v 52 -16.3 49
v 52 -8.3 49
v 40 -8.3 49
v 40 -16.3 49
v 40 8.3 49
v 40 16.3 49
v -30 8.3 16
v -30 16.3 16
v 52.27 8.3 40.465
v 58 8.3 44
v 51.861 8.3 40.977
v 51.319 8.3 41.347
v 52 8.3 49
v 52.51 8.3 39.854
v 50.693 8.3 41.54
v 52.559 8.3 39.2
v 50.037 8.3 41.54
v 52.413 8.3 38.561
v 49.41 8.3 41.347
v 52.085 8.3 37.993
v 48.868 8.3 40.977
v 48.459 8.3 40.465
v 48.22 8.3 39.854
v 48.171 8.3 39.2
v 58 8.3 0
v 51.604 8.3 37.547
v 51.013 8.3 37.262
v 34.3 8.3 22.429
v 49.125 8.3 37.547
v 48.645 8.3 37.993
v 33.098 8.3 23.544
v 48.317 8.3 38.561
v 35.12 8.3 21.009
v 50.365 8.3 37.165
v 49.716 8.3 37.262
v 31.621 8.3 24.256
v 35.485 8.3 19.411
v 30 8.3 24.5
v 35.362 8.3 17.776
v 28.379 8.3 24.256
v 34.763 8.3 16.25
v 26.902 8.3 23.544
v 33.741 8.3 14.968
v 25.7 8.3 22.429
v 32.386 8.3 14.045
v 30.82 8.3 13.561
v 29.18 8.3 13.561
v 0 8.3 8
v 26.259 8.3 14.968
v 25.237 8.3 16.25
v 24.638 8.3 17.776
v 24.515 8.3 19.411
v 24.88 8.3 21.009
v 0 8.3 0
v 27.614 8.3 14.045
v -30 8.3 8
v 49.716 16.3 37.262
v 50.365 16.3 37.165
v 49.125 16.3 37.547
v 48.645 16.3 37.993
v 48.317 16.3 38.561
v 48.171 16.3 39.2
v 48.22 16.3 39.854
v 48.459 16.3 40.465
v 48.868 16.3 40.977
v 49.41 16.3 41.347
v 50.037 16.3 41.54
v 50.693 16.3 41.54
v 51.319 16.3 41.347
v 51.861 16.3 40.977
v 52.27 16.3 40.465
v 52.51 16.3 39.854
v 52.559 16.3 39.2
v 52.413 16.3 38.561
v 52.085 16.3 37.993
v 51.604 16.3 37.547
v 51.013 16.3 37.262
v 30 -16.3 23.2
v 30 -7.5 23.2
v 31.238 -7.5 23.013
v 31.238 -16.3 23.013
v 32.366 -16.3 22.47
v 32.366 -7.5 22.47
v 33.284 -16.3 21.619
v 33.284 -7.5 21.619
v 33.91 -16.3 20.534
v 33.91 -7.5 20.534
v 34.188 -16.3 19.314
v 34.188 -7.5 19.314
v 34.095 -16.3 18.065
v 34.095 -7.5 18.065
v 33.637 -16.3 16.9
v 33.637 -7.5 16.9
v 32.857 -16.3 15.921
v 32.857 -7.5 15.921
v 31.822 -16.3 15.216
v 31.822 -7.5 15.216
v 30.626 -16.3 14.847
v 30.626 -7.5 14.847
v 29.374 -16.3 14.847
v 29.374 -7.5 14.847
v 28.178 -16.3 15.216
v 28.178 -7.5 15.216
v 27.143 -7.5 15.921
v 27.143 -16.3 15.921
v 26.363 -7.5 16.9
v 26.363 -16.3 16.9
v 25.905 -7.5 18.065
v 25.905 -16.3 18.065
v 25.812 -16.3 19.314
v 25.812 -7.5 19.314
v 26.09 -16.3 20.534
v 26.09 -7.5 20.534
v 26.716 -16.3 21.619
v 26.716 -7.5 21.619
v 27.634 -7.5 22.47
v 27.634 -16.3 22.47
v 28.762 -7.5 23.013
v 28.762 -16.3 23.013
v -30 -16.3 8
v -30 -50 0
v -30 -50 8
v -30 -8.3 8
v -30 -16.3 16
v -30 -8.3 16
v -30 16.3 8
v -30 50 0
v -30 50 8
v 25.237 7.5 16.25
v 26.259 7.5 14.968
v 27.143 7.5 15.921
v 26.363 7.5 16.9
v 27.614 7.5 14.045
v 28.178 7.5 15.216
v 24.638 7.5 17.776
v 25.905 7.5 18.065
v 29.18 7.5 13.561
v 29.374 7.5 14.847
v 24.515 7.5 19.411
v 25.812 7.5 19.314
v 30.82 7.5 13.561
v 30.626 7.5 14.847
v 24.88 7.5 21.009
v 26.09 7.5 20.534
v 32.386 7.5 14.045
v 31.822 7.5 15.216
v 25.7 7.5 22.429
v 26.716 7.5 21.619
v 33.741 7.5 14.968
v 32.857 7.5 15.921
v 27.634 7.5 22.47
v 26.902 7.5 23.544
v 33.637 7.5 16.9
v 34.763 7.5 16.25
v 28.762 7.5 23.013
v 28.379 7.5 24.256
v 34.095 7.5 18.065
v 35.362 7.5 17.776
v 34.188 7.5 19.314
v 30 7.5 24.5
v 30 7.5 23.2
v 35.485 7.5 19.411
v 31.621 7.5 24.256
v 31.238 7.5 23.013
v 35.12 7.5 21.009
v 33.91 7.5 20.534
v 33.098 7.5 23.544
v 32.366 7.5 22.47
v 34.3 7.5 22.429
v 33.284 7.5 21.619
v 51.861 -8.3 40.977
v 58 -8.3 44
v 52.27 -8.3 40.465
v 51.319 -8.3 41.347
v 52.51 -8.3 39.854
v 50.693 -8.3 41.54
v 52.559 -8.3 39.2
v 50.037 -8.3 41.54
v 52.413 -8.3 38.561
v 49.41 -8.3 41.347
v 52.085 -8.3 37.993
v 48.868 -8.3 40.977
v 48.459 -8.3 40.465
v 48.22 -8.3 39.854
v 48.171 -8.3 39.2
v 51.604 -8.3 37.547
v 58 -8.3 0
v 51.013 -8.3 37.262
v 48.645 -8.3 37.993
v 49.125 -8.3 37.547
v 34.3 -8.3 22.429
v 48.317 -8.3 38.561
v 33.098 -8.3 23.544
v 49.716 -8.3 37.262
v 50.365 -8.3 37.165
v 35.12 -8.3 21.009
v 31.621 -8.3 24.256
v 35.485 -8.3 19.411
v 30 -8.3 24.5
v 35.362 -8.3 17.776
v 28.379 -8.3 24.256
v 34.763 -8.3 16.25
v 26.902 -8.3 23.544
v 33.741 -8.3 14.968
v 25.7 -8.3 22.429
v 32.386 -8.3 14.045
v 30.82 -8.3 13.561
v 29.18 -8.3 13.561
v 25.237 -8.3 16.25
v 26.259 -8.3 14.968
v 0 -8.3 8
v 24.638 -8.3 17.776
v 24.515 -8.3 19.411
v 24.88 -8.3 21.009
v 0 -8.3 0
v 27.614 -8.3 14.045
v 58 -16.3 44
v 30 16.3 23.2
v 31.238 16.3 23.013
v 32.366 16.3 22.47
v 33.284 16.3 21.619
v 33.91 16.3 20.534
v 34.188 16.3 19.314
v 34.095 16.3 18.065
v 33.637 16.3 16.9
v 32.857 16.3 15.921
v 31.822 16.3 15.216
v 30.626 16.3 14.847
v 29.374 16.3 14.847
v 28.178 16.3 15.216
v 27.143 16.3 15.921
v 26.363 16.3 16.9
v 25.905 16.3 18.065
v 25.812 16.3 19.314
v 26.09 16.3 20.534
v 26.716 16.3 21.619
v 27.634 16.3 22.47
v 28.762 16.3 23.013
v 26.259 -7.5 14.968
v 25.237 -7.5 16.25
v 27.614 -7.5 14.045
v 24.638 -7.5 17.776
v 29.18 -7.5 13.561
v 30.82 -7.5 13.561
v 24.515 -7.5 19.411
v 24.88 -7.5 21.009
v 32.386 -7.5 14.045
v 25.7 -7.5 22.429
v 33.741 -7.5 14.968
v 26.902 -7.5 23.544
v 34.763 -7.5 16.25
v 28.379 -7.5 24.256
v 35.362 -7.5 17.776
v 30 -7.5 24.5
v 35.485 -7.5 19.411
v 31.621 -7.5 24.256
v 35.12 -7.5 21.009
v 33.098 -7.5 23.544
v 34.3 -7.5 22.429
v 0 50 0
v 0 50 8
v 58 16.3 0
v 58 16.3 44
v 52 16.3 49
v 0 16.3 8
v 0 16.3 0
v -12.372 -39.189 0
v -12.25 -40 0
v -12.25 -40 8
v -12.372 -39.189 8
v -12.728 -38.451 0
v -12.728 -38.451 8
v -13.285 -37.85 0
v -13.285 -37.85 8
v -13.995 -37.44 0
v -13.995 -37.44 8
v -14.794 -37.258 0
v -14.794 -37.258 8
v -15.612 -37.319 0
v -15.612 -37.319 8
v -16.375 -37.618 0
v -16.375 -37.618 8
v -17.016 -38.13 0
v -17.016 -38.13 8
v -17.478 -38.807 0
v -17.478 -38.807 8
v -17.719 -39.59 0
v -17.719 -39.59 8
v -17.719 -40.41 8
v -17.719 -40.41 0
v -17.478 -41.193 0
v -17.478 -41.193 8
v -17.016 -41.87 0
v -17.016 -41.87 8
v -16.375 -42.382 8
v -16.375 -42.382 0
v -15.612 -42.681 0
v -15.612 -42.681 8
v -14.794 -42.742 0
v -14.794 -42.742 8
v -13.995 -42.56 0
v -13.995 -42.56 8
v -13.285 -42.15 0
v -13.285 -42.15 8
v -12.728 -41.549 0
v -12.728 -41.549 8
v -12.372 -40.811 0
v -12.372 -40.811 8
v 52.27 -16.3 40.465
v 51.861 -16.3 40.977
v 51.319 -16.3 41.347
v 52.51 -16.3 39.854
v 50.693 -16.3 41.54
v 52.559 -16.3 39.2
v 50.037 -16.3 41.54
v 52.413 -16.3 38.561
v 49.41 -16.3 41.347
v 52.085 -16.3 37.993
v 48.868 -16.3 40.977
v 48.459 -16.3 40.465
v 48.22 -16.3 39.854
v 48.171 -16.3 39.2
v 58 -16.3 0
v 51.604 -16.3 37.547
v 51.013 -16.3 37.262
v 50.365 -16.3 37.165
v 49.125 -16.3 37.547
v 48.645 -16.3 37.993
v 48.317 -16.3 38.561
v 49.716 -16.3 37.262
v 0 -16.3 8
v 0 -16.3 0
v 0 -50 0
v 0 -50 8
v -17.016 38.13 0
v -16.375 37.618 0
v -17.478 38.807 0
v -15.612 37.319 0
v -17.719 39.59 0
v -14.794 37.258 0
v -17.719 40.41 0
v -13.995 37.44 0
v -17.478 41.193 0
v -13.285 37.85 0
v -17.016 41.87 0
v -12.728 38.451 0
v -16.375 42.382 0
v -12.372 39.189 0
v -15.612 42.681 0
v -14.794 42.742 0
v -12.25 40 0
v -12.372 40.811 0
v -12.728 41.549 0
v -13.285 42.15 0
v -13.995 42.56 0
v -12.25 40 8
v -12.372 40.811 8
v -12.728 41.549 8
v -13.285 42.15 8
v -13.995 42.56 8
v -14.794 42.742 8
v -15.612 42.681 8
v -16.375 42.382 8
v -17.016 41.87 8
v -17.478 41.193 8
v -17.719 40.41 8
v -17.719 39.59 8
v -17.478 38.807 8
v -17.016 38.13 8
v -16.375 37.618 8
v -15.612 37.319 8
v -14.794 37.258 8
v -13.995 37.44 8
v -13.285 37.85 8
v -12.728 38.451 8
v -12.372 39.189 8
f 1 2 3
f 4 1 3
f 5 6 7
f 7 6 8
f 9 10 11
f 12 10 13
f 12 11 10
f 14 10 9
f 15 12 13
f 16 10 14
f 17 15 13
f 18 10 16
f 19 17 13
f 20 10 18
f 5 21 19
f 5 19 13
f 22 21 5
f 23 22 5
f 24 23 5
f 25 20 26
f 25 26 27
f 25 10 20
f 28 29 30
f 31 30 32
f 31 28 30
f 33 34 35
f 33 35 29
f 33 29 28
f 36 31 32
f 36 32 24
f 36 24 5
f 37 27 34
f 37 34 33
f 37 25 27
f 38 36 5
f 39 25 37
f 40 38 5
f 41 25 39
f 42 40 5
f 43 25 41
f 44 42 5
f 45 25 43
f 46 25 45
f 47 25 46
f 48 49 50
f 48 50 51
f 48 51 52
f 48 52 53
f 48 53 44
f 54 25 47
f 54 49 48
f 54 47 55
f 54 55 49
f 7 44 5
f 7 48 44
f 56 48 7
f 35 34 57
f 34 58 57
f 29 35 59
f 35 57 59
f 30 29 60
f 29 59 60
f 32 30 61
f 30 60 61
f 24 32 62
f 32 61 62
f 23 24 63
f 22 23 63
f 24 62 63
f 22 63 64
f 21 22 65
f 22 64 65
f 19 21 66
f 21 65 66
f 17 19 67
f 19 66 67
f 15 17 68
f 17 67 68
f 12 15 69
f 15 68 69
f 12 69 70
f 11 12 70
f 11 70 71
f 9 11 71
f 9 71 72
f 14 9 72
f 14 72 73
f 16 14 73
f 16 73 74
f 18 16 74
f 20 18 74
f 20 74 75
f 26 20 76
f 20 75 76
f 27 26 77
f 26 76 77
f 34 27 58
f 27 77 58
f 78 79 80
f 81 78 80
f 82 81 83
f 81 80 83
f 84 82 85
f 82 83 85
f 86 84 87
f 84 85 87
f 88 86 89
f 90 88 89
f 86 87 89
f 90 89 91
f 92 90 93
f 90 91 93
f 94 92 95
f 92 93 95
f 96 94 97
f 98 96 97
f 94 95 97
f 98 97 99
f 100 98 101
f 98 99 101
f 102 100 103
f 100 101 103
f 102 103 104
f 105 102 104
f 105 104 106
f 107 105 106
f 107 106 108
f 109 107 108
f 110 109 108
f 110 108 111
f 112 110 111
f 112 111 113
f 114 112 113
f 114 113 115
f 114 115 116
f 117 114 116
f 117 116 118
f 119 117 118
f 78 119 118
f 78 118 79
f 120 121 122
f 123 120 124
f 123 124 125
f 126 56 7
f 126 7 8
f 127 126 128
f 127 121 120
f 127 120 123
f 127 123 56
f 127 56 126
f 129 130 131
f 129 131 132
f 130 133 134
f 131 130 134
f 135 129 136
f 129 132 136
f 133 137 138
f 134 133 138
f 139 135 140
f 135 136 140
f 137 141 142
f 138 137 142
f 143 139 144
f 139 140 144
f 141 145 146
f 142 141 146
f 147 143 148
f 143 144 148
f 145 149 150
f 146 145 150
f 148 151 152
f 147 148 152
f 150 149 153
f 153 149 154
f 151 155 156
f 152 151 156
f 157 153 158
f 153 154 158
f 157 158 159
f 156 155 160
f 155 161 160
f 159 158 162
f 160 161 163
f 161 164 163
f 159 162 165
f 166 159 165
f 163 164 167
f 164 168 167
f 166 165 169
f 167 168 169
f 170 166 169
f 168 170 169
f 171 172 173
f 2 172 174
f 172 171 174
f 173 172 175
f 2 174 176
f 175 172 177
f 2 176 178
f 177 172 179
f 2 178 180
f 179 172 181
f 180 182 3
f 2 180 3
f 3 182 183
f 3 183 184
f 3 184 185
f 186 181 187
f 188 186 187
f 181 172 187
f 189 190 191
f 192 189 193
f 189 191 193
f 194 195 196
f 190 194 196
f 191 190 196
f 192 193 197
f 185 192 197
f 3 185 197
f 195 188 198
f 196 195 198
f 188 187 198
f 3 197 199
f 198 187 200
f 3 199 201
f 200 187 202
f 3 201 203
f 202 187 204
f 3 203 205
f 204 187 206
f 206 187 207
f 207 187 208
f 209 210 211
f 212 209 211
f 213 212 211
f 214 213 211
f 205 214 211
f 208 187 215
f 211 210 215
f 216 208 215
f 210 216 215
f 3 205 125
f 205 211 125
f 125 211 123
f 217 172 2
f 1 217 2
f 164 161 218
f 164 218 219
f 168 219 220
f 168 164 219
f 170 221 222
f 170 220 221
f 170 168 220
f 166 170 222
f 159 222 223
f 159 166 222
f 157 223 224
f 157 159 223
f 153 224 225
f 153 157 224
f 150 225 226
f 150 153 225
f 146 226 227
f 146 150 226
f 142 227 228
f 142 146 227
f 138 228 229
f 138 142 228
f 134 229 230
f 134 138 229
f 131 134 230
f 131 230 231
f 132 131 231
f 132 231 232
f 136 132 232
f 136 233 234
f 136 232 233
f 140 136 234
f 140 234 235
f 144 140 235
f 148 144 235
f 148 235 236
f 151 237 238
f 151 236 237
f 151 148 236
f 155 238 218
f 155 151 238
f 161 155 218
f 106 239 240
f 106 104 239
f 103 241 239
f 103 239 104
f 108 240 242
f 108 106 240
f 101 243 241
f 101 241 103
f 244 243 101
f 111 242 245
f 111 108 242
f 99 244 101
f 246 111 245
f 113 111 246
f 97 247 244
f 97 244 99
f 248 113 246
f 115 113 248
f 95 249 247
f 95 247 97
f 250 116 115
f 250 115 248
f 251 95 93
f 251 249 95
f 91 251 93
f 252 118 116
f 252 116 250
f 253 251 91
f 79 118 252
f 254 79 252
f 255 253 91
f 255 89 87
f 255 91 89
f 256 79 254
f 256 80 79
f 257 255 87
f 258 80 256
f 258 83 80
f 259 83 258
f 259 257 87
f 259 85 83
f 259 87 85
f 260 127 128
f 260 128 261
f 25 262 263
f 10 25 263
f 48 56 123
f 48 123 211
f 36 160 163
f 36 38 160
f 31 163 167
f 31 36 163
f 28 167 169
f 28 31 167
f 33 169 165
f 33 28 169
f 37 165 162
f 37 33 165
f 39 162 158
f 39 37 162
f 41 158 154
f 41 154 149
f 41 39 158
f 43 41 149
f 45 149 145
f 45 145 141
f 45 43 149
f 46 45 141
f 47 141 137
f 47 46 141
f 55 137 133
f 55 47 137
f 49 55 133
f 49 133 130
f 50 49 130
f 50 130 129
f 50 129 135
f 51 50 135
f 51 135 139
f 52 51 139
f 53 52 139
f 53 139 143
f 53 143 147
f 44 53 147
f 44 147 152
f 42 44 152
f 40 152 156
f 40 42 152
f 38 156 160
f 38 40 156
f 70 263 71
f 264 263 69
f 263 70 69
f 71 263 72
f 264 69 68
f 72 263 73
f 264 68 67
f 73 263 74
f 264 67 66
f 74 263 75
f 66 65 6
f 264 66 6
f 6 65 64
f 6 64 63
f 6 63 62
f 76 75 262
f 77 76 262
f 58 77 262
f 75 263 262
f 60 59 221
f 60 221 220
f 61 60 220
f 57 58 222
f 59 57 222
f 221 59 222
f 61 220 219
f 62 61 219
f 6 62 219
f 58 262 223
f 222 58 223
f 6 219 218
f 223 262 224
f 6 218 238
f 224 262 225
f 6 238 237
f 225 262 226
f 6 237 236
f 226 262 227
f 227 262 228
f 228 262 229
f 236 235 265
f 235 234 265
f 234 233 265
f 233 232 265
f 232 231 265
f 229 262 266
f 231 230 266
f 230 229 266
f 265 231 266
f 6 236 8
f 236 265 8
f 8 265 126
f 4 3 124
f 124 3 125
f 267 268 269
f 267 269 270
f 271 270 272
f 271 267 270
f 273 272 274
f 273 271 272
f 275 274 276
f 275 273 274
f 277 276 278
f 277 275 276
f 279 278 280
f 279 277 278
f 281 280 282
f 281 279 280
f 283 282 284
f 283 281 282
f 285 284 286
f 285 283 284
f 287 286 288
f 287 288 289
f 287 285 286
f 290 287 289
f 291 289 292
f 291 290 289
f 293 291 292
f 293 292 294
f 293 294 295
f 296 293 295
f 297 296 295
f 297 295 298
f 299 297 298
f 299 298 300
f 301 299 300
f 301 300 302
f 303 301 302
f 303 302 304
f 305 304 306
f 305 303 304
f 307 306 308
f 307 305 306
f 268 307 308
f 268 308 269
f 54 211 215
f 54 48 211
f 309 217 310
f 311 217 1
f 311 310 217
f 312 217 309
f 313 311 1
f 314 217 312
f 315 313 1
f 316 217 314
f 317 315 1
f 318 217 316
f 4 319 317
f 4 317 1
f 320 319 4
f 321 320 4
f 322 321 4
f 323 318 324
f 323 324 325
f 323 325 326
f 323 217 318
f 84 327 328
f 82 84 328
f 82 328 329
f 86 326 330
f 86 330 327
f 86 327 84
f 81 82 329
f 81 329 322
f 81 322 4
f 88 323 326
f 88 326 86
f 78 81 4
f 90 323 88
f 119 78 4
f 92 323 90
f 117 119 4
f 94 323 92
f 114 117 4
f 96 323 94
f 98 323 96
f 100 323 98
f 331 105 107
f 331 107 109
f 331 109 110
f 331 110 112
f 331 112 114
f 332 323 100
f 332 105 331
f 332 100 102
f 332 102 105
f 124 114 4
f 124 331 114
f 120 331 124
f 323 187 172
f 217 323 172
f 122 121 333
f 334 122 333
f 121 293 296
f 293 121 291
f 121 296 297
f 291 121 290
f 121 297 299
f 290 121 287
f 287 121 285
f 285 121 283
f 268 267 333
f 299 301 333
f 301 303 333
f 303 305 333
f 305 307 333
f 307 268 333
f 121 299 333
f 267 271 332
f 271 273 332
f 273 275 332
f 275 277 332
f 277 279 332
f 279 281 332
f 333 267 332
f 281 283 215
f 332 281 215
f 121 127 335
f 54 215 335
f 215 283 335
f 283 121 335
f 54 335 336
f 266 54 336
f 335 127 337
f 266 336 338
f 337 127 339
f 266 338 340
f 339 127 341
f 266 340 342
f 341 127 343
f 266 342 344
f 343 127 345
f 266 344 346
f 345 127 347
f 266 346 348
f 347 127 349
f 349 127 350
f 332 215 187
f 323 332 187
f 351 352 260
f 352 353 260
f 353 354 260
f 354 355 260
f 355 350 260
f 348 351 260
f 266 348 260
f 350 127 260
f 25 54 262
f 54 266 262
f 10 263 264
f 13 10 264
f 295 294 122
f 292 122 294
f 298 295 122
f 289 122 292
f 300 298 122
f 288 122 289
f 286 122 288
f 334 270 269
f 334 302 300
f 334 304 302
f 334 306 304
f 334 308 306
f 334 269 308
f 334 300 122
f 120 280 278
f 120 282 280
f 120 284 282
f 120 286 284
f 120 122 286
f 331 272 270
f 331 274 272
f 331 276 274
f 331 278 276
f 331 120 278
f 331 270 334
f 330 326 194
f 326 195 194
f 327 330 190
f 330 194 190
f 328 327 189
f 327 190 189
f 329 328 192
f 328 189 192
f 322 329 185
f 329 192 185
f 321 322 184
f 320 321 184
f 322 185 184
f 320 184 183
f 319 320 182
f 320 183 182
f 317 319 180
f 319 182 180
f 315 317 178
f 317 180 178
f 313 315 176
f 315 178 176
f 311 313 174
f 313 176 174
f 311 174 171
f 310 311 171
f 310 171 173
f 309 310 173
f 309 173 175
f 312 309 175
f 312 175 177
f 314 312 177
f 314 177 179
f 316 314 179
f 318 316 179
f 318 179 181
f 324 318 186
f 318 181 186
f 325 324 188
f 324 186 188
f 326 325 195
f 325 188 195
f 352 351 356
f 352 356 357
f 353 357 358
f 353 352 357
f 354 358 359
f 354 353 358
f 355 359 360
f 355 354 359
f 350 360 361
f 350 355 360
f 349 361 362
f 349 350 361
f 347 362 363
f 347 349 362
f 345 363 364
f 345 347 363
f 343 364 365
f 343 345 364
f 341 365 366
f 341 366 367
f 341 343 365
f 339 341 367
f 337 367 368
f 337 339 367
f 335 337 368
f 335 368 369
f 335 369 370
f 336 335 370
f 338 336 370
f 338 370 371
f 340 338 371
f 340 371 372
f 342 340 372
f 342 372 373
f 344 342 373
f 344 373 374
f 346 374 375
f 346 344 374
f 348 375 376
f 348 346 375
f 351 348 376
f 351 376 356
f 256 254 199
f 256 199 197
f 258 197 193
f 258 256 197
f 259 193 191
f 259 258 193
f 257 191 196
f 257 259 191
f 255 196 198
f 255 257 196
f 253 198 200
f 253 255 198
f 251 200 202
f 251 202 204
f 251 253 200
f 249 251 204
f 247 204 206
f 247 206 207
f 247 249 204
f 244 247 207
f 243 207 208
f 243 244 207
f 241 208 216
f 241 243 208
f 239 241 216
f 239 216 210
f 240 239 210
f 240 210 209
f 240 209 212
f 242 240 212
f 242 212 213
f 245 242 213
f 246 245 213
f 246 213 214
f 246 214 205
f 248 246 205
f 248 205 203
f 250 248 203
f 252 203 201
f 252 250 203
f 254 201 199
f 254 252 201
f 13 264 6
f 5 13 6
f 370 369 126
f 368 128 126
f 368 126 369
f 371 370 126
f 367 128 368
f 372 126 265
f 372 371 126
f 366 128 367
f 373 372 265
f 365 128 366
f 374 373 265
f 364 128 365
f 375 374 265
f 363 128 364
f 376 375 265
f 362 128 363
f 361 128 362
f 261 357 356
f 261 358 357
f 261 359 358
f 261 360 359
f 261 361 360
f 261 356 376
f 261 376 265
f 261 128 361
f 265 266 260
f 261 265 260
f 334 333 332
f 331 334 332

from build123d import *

# Parameters (mm, degrees)
SKETCH_1_W          = 30
SKETCH_1_H          = 100
SKETCH_1_R          = 2.75
EXTRUDE_2_DEPTH     = 8
EXTRUDE_4_DEPTH     = 16.3
CUT_EXTRUDE_1_DEPTH = 8.3
SKETCH_5_R          = 5.5
EXTRUDE_5_DEPTH     = 8.3
SKETCH_6_R          = 5.5
CUT_EXTRUDE_2_DEPTH = 7.5
SKETCH_7_R          = 4.2
SKETCH_7_R_2        = 2.2
CUT_EXTRUDE_3_DEPTH = 21.3


with BuildPart() as part:
    # 草图1 → 凸台-拉伸2 (new body)
    with BuildSketch(Plane.XY):
        with Locations((-15, 0)):
            Rectangle(SKETCH_1_W, SKETCH_1_H)
        with Locations((-15, -40)):
            Circle(SKETCH_1_R, mode=Mode.SUBTRACT)
        with Locations((-15, 40)):
            Circle(SKETCH_1_R, mode=Mode.SUBTRACT)
    extrude(amount=EXTRUDE_2_DEPTH)

    # 草图3 → 凸台-拉伸4 (add, symmetric)
    with BuildSketch(Plane(origin=(0, 0, 0), x_dir=(1, 0, 0), z_dir=(0, 1, 0))):
        Polygon((-30, 0), (58, 0), (58, -44), (52, -49), (40, -49), (-30, -16), align=None)
    extrude(amount=EXTRUDE_4_DEPTH, both=True)

    # 草图4 → 切除-拉伸1 (cut, symmetric)
    with BuildSketch(Plane(origin=(0, 0, 0), x_dir=(1, 0, 0), z_dir=(0, 1, 0))):
        Polygon((-30, -8), (0, -8), (0, 0), (58, 0), (58, -44), (52, -49), (40, -49), (-30, -16), align=None)
    extrude(amount=CUT_EXTRUDE_1_DEPTH, both=True, mode=Mode.SUBTRACT)

    # 草图5 → 凸台-拉伸5 (add, symmetric)
    with BuildSketch(Plane(origin=(0, 0, 0), x_dir=(1, 0, 0), z_dir=(0, 1, 0))):
        with Locations(Location((30, -19, 0), (0, 0, 270))):
            Circle(SKETCH_5_R)
    extrude(amount=EXTRUDE_5_DEPTH, both=True)

    # 草图6 → 切除-拉伸2 (cut, symmetric)
    with BuildSketch(Plane(origin=(0, 0, 0), x_dir=(1, 0, 0), z_dir=(0, 1, 0))):
        with Locations(Location((30, -19, 0), (0, 0, 270))):
            Circle(SKETCH_6_R)
    extrude(amount=CUT_EXTRUDE_2_DEPTH, both=True, mode=Mode.SUBTRACT)

    # 草图7 → 切除-拉伸3 (cut, symmetric)
    with BuildSketch(Plane(origin=(0, 0, 0), x_dir=(1, 0, 0), z_dir=(0, 1, 0))):
        with Locations(Location((30, -19, 0), (0, 0, 270))):
            Circle(SKETCH_7_R)
        with Locations(Location((50.364675298, -39.364675298, 0), (0, 0, 90))):
            Circle(SKETCH_7_R_2)
    extrude(amount=CUT_EXTRUDE_3_DEPTH, both=True, mode=Mode.SUBTRACT)


solid = part.part
